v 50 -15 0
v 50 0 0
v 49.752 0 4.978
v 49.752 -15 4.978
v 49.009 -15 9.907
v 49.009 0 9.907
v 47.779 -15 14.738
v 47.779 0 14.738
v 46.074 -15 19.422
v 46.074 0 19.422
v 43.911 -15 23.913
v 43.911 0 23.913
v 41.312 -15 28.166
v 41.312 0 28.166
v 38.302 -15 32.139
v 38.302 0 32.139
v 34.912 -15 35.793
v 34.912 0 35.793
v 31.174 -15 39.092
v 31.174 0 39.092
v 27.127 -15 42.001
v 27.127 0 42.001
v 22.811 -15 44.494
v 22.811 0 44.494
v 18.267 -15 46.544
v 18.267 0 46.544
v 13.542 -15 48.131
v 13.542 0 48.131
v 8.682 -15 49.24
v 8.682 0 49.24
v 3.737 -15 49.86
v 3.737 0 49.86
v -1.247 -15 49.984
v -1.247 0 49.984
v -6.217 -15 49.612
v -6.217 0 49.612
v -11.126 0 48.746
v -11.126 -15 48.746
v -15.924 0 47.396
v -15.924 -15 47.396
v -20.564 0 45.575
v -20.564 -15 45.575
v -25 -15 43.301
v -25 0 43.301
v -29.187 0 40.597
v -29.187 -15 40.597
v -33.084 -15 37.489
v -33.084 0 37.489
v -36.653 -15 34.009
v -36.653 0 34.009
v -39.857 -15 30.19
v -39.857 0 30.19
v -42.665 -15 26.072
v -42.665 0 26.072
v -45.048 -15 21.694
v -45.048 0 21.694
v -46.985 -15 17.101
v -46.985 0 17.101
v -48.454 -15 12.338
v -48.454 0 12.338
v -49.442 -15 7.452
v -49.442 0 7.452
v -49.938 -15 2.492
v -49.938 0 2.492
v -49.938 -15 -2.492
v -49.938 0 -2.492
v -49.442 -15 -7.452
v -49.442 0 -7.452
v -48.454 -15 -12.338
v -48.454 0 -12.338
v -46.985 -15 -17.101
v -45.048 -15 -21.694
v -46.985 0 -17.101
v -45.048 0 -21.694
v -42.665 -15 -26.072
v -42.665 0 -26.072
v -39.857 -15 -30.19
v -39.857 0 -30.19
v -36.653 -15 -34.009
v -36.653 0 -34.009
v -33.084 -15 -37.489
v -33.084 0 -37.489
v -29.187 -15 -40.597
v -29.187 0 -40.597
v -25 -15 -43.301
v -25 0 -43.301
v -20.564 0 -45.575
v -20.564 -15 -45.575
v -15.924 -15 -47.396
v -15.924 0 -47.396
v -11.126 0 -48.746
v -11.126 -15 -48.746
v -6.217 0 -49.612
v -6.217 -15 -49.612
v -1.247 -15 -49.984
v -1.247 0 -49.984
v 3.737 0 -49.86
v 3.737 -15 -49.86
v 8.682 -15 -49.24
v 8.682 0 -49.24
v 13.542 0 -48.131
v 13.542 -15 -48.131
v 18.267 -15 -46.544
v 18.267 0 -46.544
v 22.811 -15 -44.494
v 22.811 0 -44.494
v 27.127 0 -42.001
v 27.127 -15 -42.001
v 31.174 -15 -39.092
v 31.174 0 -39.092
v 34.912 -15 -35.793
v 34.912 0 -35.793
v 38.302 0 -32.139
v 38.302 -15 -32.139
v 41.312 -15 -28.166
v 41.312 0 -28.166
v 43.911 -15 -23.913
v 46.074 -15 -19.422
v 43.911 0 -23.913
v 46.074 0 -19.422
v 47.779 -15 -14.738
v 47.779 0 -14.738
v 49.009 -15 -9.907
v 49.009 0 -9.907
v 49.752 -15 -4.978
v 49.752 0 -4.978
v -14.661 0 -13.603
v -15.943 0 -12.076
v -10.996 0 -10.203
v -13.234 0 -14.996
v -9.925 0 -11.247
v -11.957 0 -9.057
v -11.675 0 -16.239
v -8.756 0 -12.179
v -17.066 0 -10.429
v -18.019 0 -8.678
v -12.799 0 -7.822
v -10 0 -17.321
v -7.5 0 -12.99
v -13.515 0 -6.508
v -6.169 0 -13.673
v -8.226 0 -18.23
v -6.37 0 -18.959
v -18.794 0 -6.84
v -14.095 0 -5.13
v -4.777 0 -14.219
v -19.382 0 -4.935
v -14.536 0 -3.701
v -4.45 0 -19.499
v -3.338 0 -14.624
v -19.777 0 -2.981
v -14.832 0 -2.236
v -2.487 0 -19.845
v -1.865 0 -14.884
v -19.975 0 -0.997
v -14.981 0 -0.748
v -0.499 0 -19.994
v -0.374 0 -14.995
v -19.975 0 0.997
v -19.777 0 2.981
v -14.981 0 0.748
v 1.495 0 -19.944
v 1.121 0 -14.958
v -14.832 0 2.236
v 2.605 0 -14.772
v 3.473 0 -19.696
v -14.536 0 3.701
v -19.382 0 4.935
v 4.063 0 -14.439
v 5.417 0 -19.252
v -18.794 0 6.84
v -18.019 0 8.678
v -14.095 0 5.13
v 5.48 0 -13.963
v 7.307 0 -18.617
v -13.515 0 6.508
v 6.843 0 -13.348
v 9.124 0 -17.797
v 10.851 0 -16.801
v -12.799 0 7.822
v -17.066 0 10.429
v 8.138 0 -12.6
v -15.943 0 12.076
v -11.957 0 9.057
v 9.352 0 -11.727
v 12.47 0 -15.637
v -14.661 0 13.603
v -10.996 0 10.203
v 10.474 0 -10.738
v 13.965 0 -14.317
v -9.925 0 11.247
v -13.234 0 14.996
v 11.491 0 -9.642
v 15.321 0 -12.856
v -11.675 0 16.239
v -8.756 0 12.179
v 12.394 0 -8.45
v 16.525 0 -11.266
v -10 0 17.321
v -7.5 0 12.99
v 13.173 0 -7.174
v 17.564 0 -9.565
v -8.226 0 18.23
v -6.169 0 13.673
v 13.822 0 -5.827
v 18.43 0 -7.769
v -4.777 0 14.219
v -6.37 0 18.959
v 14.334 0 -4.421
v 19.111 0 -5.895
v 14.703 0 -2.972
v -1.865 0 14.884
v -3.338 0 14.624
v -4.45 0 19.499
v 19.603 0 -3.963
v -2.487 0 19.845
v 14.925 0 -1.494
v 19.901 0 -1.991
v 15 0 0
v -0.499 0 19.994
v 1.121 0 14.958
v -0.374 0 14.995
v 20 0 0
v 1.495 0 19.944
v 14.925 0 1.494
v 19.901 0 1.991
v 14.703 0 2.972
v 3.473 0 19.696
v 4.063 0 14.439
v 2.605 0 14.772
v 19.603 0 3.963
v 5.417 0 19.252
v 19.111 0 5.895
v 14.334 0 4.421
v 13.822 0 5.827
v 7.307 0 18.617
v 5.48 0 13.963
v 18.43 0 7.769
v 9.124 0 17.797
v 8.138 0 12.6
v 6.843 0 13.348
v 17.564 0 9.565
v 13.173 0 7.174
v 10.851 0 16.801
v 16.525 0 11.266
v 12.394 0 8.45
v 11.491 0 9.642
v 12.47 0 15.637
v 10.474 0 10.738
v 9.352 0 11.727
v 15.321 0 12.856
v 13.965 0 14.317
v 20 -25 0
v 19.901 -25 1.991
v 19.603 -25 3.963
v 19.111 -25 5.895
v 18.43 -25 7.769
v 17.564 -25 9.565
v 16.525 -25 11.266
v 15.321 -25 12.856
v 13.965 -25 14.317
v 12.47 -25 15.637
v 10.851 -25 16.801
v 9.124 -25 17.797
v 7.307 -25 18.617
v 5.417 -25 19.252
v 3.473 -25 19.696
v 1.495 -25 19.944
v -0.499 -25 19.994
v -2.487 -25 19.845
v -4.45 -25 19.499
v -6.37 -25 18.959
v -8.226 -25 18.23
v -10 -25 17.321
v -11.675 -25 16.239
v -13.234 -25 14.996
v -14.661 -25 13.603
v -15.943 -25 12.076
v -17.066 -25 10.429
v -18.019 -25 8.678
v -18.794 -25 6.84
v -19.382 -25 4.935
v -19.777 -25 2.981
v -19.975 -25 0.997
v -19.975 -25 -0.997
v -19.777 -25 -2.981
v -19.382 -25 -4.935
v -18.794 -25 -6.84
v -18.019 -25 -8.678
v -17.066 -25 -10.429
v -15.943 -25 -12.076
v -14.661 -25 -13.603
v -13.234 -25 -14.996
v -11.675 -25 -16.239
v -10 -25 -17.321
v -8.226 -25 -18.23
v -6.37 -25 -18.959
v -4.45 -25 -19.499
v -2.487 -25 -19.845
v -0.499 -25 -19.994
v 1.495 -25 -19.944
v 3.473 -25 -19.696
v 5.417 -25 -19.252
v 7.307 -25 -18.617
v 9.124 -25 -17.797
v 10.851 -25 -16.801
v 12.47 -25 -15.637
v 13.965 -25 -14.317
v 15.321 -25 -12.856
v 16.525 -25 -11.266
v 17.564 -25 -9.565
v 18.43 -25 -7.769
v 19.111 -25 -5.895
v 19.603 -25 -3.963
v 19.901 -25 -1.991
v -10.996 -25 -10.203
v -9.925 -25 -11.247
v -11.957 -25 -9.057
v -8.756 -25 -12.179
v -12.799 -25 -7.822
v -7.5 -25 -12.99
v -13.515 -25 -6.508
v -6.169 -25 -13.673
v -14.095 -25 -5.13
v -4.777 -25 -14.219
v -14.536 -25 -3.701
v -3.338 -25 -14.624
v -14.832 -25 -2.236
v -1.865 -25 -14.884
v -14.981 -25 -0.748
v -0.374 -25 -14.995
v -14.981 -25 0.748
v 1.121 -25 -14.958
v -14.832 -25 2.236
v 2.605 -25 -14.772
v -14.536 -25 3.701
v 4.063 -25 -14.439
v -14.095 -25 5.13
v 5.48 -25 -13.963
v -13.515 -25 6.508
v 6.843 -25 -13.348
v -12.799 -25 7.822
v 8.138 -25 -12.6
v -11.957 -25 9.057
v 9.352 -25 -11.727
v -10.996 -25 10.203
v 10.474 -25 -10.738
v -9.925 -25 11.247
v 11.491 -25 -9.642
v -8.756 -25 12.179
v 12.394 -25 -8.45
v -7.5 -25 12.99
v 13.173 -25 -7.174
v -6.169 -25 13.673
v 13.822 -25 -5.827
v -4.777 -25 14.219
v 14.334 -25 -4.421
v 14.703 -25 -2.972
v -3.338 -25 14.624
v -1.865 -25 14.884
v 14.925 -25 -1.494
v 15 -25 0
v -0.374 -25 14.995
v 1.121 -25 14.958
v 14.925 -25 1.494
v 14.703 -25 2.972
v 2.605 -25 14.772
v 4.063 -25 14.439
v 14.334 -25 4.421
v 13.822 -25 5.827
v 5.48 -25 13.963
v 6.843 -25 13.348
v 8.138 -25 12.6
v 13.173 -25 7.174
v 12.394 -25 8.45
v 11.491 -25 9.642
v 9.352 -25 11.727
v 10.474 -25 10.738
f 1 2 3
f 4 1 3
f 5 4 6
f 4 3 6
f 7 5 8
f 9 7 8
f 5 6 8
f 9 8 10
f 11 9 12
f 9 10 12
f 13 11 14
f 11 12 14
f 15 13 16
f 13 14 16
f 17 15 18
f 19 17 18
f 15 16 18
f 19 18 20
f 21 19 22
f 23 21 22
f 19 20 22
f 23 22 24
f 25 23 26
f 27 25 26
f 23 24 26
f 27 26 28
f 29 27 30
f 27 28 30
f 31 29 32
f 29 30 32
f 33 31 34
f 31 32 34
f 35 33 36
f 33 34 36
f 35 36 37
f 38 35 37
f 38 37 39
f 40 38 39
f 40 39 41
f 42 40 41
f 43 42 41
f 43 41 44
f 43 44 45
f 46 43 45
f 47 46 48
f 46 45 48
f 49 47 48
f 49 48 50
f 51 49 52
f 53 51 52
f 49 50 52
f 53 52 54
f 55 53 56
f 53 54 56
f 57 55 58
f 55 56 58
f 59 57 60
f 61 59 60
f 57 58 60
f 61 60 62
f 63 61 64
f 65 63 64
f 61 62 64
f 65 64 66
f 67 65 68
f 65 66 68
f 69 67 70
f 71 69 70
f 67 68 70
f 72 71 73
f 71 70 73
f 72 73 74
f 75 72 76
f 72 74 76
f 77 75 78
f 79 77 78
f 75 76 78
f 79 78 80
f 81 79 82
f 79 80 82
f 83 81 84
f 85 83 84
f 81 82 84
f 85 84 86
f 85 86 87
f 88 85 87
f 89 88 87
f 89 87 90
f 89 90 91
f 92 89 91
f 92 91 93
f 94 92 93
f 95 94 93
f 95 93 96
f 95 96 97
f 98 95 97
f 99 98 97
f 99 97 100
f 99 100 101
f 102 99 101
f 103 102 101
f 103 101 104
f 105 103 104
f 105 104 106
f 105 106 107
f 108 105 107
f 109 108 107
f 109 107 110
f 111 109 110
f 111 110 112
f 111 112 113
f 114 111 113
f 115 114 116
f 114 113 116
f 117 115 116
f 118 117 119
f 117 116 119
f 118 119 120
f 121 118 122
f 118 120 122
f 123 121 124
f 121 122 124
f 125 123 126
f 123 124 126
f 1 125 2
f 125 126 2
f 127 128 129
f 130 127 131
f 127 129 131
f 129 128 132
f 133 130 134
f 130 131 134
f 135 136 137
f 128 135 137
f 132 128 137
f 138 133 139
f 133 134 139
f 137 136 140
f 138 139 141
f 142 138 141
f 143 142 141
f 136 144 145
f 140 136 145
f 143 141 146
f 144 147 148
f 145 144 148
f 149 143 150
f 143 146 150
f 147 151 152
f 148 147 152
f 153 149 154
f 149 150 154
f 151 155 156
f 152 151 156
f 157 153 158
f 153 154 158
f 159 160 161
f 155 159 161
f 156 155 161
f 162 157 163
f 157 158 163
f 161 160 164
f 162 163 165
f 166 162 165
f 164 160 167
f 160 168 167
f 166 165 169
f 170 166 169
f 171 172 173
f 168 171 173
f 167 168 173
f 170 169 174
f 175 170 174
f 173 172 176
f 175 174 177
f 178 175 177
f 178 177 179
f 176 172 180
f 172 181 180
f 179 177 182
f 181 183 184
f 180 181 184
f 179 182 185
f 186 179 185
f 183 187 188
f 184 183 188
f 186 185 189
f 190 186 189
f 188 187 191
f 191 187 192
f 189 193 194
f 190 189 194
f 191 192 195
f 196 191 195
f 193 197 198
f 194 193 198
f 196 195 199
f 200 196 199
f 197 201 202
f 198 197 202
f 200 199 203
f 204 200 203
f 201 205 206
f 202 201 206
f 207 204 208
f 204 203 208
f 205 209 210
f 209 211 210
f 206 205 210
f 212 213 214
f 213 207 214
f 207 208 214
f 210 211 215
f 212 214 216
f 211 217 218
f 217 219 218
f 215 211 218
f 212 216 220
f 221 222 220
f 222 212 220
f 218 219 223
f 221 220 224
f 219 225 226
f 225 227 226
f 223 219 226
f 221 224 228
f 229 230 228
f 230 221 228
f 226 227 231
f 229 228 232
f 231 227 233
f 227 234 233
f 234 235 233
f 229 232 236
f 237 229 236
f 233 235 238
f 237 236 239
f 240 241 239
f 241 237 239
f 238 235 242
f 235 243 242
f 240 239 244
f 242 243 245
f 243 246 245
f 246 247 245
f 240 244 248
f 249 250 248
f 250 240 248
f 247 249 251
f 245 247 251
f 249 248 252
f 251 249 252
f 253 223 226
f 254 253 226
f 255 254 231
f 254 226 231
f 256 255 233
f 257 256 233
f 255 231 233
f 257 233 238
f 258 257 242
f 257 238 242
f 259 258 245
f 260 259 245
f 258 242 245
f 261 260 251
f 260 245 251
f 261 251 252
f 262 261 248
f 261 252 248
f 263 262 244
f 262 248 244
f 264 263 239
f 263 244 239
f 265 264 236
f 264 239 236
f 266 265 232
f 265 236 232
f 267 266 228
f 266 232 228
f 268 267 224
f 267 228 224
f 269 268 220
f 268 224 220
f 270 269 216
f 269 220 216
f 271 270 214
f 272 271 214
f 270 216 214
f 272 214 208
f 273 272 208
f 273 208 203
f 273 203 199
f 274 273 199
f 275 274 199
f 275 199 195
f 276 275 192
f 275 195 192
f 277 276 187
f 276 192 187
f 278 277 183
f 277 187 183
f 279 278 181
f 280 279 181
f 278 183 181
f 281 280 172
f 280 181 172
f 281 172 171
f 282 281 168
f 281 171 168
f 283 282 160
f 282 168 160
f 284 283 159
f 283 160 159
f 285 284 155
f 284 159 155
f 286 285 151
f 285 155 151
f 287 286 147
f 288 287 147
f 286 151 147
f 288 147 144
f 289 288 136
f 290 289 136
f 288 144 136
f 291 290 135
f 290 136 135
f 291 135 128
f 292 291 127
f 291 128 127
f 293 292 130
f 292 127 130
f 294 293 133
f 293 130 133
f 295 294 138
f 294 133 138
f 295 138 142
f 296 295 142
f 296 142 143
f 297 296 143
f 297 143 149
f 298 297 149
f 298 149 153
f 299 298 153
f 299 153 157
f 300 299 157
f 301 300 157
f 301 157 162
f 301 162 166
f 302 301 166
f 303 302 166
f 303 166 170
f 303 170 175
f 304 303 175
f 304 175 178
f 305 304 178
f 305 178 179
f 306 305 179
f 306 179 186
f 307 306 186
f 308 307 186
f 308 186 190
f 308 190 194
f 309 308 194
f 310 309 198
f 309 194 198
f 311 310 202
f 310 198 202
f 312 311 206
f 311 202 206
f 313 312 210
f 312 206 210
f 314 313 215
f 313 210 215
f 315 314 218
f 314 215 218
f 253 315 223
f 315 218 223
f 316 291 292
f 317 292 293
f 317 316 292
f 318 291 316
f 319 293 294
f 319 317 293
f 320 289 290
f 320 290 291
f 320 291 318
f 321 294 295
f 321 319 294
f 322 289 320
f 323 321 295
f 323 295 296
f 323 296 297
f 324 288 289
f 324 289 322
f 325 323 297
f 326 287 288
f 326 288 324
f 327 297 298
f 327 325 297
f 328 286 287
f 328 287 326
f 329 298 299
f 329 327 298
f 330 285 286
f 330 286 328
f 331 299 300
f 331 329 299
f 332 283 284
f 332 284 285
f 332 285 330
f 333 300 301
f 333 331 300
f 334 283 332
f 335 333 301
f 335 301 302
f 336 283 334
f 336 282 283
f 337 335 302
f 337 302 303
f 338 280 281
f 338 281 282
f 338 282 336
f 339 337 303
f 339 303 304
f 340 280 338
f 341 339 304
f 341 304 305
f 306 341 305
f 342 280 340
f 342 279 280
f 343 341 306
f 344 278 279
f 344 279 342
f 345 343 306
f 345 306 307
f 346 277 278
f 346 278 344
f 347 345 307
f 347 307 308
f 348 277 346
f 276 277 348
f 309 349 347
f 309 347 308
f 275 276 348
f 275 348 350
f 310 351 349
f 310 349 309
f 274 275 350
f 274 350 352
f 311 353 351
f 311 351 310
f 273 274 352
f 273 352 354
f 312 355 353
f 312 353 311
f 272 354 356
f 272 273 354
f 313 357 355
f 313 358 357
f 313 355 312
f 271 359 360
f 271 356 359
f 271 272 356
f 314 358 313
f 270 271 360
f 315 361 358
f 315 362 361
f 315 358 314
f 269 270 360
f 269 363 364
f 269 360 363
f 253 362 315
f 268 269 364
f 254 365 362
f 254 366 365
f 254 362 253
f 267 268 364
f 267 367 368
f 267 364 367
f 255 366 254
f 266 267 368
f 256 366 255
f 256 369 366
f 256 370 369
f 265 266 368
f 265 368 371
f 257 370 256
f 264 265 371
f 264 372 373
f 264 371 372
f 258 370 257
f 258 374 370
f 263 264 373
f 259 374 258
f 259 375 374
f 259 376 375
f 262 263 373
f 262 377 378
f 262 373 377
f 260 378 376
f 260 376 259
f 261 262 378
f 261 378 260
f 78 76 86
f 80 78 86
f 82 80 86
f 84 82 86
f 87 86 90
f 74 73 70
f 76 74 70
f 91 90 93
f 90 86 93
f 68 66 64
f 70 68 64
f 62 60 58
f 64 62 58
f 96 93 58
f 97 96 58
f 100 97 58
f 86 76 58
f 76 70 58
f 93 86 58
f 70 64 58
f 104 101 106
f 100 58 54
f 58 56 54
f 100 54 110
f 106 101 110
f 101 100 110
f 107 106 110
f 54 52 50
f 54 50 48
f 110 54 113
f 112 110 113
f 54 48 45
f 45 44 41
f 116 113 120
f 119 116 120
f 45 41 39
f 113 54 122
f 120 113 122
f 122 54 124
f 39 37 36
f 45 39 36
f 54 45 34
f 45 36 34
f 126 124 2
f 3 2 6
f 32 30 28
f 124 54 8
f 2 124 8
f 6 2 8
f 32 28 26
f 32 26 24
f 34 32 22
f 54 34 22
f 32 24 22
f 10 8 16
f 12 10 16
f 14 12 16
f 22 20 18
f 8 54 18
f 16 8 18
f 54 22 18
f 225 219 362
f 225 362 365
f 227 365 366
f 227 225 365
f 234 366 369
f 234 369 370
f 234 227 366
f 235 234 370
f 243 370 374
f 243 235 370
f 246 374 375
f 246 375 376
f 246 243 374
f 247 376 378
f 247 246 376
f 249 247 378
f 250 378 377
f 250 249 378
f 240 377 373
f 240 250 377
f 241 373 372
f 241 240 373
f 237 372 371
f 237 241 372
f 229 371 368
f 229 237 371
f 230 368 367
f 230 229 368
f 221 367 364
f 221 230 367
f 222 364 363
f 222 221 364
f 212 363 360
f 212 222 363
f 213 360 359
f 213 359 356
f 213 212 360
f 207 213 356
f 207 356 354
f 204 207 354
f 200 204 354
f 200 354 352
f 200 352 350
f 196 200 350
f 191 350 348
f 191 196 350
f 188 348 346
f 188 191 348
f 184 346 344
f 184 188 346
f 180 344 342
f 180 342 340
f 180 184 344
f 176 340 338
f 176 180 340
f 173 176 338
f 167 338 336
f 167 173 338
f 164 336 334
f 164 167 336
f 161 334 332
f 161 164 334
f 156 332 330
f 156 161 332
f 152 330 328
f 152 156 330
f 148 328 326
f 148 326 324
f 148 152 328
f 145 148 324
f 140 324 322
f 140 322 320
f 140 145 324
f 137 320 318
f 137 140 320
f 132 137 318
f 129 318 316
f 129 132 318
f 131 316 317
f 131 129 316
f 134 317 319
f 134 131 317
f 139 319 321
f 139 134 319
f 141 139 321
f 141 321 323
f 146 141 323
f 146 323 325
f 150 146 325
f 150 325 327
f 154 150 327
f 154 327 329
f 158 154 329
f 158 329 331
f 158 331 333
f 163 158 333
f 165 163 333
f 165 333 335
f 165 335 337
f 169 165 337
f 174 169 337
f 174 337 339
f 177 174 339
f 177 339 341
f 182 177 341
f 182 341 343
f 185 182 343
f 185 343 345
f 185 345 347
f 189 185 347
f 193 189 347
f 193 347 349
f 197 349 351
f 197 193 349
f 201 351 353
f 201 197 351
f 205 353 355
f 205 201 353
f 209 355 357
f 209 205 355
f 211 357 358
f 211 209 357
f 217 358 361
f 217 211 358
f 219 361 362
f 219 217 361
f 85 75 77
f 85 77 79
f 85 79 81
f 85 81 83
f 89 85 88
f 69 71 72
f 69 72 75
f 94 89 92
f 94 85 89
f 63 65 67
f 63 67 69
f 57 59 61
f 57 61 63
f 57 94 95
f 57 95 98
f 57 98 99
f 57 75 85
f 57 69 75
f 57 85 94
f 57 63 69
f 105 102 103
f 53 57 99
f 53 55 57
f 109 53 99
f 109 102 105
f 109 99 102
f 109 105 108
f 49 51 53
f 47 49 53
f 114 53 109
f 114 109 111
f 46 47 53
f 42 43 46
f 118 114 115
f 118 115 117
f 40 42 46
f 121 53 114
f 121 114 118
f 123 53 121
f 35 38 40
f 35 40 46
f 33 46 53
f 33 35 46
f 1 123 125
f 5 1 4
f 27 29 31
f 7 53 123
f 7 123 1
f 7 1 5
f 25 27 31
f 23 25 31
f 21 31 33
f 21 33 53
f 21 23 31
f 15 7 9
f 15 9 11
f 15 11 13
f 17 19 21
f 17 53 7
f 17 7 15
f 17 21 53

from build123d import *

# Parameters (mm, degrees)
F0_R     = 50
F1_DEPTH = 15
F3_R     = 20
F4_DEPTH = 25
F2_R     = 15


with BuildPart() as f1:
    # F0 (on Front) → F1 (new body)
    with BuildSketch(Plane.XZ):
        Circle(F0_R)
    extrude(amount=F1_DEPTH)


with BuildPart() as f4:
    # F3 (on Front) → F4 (new body)
    with BuildSketch(Plane.XZ):
        Circle(F3_R)
    extrude(amount=F4_DEPTH)


with BuildPart() as f4b:
    # F2 (on Front) → F4, piece 2 (new body)
    with BuildSketch(Plane.XZ):
        Circle(F2_R)
    extrude(amount=F4_DEPTH)


with BuildPart() as f4_1:
    add(f4.part)

    # F5: cut F4b
    add(f4b.part, mode=Mode.SUBTRACT)


solid = Compound([f1.part, f4_1.part])
